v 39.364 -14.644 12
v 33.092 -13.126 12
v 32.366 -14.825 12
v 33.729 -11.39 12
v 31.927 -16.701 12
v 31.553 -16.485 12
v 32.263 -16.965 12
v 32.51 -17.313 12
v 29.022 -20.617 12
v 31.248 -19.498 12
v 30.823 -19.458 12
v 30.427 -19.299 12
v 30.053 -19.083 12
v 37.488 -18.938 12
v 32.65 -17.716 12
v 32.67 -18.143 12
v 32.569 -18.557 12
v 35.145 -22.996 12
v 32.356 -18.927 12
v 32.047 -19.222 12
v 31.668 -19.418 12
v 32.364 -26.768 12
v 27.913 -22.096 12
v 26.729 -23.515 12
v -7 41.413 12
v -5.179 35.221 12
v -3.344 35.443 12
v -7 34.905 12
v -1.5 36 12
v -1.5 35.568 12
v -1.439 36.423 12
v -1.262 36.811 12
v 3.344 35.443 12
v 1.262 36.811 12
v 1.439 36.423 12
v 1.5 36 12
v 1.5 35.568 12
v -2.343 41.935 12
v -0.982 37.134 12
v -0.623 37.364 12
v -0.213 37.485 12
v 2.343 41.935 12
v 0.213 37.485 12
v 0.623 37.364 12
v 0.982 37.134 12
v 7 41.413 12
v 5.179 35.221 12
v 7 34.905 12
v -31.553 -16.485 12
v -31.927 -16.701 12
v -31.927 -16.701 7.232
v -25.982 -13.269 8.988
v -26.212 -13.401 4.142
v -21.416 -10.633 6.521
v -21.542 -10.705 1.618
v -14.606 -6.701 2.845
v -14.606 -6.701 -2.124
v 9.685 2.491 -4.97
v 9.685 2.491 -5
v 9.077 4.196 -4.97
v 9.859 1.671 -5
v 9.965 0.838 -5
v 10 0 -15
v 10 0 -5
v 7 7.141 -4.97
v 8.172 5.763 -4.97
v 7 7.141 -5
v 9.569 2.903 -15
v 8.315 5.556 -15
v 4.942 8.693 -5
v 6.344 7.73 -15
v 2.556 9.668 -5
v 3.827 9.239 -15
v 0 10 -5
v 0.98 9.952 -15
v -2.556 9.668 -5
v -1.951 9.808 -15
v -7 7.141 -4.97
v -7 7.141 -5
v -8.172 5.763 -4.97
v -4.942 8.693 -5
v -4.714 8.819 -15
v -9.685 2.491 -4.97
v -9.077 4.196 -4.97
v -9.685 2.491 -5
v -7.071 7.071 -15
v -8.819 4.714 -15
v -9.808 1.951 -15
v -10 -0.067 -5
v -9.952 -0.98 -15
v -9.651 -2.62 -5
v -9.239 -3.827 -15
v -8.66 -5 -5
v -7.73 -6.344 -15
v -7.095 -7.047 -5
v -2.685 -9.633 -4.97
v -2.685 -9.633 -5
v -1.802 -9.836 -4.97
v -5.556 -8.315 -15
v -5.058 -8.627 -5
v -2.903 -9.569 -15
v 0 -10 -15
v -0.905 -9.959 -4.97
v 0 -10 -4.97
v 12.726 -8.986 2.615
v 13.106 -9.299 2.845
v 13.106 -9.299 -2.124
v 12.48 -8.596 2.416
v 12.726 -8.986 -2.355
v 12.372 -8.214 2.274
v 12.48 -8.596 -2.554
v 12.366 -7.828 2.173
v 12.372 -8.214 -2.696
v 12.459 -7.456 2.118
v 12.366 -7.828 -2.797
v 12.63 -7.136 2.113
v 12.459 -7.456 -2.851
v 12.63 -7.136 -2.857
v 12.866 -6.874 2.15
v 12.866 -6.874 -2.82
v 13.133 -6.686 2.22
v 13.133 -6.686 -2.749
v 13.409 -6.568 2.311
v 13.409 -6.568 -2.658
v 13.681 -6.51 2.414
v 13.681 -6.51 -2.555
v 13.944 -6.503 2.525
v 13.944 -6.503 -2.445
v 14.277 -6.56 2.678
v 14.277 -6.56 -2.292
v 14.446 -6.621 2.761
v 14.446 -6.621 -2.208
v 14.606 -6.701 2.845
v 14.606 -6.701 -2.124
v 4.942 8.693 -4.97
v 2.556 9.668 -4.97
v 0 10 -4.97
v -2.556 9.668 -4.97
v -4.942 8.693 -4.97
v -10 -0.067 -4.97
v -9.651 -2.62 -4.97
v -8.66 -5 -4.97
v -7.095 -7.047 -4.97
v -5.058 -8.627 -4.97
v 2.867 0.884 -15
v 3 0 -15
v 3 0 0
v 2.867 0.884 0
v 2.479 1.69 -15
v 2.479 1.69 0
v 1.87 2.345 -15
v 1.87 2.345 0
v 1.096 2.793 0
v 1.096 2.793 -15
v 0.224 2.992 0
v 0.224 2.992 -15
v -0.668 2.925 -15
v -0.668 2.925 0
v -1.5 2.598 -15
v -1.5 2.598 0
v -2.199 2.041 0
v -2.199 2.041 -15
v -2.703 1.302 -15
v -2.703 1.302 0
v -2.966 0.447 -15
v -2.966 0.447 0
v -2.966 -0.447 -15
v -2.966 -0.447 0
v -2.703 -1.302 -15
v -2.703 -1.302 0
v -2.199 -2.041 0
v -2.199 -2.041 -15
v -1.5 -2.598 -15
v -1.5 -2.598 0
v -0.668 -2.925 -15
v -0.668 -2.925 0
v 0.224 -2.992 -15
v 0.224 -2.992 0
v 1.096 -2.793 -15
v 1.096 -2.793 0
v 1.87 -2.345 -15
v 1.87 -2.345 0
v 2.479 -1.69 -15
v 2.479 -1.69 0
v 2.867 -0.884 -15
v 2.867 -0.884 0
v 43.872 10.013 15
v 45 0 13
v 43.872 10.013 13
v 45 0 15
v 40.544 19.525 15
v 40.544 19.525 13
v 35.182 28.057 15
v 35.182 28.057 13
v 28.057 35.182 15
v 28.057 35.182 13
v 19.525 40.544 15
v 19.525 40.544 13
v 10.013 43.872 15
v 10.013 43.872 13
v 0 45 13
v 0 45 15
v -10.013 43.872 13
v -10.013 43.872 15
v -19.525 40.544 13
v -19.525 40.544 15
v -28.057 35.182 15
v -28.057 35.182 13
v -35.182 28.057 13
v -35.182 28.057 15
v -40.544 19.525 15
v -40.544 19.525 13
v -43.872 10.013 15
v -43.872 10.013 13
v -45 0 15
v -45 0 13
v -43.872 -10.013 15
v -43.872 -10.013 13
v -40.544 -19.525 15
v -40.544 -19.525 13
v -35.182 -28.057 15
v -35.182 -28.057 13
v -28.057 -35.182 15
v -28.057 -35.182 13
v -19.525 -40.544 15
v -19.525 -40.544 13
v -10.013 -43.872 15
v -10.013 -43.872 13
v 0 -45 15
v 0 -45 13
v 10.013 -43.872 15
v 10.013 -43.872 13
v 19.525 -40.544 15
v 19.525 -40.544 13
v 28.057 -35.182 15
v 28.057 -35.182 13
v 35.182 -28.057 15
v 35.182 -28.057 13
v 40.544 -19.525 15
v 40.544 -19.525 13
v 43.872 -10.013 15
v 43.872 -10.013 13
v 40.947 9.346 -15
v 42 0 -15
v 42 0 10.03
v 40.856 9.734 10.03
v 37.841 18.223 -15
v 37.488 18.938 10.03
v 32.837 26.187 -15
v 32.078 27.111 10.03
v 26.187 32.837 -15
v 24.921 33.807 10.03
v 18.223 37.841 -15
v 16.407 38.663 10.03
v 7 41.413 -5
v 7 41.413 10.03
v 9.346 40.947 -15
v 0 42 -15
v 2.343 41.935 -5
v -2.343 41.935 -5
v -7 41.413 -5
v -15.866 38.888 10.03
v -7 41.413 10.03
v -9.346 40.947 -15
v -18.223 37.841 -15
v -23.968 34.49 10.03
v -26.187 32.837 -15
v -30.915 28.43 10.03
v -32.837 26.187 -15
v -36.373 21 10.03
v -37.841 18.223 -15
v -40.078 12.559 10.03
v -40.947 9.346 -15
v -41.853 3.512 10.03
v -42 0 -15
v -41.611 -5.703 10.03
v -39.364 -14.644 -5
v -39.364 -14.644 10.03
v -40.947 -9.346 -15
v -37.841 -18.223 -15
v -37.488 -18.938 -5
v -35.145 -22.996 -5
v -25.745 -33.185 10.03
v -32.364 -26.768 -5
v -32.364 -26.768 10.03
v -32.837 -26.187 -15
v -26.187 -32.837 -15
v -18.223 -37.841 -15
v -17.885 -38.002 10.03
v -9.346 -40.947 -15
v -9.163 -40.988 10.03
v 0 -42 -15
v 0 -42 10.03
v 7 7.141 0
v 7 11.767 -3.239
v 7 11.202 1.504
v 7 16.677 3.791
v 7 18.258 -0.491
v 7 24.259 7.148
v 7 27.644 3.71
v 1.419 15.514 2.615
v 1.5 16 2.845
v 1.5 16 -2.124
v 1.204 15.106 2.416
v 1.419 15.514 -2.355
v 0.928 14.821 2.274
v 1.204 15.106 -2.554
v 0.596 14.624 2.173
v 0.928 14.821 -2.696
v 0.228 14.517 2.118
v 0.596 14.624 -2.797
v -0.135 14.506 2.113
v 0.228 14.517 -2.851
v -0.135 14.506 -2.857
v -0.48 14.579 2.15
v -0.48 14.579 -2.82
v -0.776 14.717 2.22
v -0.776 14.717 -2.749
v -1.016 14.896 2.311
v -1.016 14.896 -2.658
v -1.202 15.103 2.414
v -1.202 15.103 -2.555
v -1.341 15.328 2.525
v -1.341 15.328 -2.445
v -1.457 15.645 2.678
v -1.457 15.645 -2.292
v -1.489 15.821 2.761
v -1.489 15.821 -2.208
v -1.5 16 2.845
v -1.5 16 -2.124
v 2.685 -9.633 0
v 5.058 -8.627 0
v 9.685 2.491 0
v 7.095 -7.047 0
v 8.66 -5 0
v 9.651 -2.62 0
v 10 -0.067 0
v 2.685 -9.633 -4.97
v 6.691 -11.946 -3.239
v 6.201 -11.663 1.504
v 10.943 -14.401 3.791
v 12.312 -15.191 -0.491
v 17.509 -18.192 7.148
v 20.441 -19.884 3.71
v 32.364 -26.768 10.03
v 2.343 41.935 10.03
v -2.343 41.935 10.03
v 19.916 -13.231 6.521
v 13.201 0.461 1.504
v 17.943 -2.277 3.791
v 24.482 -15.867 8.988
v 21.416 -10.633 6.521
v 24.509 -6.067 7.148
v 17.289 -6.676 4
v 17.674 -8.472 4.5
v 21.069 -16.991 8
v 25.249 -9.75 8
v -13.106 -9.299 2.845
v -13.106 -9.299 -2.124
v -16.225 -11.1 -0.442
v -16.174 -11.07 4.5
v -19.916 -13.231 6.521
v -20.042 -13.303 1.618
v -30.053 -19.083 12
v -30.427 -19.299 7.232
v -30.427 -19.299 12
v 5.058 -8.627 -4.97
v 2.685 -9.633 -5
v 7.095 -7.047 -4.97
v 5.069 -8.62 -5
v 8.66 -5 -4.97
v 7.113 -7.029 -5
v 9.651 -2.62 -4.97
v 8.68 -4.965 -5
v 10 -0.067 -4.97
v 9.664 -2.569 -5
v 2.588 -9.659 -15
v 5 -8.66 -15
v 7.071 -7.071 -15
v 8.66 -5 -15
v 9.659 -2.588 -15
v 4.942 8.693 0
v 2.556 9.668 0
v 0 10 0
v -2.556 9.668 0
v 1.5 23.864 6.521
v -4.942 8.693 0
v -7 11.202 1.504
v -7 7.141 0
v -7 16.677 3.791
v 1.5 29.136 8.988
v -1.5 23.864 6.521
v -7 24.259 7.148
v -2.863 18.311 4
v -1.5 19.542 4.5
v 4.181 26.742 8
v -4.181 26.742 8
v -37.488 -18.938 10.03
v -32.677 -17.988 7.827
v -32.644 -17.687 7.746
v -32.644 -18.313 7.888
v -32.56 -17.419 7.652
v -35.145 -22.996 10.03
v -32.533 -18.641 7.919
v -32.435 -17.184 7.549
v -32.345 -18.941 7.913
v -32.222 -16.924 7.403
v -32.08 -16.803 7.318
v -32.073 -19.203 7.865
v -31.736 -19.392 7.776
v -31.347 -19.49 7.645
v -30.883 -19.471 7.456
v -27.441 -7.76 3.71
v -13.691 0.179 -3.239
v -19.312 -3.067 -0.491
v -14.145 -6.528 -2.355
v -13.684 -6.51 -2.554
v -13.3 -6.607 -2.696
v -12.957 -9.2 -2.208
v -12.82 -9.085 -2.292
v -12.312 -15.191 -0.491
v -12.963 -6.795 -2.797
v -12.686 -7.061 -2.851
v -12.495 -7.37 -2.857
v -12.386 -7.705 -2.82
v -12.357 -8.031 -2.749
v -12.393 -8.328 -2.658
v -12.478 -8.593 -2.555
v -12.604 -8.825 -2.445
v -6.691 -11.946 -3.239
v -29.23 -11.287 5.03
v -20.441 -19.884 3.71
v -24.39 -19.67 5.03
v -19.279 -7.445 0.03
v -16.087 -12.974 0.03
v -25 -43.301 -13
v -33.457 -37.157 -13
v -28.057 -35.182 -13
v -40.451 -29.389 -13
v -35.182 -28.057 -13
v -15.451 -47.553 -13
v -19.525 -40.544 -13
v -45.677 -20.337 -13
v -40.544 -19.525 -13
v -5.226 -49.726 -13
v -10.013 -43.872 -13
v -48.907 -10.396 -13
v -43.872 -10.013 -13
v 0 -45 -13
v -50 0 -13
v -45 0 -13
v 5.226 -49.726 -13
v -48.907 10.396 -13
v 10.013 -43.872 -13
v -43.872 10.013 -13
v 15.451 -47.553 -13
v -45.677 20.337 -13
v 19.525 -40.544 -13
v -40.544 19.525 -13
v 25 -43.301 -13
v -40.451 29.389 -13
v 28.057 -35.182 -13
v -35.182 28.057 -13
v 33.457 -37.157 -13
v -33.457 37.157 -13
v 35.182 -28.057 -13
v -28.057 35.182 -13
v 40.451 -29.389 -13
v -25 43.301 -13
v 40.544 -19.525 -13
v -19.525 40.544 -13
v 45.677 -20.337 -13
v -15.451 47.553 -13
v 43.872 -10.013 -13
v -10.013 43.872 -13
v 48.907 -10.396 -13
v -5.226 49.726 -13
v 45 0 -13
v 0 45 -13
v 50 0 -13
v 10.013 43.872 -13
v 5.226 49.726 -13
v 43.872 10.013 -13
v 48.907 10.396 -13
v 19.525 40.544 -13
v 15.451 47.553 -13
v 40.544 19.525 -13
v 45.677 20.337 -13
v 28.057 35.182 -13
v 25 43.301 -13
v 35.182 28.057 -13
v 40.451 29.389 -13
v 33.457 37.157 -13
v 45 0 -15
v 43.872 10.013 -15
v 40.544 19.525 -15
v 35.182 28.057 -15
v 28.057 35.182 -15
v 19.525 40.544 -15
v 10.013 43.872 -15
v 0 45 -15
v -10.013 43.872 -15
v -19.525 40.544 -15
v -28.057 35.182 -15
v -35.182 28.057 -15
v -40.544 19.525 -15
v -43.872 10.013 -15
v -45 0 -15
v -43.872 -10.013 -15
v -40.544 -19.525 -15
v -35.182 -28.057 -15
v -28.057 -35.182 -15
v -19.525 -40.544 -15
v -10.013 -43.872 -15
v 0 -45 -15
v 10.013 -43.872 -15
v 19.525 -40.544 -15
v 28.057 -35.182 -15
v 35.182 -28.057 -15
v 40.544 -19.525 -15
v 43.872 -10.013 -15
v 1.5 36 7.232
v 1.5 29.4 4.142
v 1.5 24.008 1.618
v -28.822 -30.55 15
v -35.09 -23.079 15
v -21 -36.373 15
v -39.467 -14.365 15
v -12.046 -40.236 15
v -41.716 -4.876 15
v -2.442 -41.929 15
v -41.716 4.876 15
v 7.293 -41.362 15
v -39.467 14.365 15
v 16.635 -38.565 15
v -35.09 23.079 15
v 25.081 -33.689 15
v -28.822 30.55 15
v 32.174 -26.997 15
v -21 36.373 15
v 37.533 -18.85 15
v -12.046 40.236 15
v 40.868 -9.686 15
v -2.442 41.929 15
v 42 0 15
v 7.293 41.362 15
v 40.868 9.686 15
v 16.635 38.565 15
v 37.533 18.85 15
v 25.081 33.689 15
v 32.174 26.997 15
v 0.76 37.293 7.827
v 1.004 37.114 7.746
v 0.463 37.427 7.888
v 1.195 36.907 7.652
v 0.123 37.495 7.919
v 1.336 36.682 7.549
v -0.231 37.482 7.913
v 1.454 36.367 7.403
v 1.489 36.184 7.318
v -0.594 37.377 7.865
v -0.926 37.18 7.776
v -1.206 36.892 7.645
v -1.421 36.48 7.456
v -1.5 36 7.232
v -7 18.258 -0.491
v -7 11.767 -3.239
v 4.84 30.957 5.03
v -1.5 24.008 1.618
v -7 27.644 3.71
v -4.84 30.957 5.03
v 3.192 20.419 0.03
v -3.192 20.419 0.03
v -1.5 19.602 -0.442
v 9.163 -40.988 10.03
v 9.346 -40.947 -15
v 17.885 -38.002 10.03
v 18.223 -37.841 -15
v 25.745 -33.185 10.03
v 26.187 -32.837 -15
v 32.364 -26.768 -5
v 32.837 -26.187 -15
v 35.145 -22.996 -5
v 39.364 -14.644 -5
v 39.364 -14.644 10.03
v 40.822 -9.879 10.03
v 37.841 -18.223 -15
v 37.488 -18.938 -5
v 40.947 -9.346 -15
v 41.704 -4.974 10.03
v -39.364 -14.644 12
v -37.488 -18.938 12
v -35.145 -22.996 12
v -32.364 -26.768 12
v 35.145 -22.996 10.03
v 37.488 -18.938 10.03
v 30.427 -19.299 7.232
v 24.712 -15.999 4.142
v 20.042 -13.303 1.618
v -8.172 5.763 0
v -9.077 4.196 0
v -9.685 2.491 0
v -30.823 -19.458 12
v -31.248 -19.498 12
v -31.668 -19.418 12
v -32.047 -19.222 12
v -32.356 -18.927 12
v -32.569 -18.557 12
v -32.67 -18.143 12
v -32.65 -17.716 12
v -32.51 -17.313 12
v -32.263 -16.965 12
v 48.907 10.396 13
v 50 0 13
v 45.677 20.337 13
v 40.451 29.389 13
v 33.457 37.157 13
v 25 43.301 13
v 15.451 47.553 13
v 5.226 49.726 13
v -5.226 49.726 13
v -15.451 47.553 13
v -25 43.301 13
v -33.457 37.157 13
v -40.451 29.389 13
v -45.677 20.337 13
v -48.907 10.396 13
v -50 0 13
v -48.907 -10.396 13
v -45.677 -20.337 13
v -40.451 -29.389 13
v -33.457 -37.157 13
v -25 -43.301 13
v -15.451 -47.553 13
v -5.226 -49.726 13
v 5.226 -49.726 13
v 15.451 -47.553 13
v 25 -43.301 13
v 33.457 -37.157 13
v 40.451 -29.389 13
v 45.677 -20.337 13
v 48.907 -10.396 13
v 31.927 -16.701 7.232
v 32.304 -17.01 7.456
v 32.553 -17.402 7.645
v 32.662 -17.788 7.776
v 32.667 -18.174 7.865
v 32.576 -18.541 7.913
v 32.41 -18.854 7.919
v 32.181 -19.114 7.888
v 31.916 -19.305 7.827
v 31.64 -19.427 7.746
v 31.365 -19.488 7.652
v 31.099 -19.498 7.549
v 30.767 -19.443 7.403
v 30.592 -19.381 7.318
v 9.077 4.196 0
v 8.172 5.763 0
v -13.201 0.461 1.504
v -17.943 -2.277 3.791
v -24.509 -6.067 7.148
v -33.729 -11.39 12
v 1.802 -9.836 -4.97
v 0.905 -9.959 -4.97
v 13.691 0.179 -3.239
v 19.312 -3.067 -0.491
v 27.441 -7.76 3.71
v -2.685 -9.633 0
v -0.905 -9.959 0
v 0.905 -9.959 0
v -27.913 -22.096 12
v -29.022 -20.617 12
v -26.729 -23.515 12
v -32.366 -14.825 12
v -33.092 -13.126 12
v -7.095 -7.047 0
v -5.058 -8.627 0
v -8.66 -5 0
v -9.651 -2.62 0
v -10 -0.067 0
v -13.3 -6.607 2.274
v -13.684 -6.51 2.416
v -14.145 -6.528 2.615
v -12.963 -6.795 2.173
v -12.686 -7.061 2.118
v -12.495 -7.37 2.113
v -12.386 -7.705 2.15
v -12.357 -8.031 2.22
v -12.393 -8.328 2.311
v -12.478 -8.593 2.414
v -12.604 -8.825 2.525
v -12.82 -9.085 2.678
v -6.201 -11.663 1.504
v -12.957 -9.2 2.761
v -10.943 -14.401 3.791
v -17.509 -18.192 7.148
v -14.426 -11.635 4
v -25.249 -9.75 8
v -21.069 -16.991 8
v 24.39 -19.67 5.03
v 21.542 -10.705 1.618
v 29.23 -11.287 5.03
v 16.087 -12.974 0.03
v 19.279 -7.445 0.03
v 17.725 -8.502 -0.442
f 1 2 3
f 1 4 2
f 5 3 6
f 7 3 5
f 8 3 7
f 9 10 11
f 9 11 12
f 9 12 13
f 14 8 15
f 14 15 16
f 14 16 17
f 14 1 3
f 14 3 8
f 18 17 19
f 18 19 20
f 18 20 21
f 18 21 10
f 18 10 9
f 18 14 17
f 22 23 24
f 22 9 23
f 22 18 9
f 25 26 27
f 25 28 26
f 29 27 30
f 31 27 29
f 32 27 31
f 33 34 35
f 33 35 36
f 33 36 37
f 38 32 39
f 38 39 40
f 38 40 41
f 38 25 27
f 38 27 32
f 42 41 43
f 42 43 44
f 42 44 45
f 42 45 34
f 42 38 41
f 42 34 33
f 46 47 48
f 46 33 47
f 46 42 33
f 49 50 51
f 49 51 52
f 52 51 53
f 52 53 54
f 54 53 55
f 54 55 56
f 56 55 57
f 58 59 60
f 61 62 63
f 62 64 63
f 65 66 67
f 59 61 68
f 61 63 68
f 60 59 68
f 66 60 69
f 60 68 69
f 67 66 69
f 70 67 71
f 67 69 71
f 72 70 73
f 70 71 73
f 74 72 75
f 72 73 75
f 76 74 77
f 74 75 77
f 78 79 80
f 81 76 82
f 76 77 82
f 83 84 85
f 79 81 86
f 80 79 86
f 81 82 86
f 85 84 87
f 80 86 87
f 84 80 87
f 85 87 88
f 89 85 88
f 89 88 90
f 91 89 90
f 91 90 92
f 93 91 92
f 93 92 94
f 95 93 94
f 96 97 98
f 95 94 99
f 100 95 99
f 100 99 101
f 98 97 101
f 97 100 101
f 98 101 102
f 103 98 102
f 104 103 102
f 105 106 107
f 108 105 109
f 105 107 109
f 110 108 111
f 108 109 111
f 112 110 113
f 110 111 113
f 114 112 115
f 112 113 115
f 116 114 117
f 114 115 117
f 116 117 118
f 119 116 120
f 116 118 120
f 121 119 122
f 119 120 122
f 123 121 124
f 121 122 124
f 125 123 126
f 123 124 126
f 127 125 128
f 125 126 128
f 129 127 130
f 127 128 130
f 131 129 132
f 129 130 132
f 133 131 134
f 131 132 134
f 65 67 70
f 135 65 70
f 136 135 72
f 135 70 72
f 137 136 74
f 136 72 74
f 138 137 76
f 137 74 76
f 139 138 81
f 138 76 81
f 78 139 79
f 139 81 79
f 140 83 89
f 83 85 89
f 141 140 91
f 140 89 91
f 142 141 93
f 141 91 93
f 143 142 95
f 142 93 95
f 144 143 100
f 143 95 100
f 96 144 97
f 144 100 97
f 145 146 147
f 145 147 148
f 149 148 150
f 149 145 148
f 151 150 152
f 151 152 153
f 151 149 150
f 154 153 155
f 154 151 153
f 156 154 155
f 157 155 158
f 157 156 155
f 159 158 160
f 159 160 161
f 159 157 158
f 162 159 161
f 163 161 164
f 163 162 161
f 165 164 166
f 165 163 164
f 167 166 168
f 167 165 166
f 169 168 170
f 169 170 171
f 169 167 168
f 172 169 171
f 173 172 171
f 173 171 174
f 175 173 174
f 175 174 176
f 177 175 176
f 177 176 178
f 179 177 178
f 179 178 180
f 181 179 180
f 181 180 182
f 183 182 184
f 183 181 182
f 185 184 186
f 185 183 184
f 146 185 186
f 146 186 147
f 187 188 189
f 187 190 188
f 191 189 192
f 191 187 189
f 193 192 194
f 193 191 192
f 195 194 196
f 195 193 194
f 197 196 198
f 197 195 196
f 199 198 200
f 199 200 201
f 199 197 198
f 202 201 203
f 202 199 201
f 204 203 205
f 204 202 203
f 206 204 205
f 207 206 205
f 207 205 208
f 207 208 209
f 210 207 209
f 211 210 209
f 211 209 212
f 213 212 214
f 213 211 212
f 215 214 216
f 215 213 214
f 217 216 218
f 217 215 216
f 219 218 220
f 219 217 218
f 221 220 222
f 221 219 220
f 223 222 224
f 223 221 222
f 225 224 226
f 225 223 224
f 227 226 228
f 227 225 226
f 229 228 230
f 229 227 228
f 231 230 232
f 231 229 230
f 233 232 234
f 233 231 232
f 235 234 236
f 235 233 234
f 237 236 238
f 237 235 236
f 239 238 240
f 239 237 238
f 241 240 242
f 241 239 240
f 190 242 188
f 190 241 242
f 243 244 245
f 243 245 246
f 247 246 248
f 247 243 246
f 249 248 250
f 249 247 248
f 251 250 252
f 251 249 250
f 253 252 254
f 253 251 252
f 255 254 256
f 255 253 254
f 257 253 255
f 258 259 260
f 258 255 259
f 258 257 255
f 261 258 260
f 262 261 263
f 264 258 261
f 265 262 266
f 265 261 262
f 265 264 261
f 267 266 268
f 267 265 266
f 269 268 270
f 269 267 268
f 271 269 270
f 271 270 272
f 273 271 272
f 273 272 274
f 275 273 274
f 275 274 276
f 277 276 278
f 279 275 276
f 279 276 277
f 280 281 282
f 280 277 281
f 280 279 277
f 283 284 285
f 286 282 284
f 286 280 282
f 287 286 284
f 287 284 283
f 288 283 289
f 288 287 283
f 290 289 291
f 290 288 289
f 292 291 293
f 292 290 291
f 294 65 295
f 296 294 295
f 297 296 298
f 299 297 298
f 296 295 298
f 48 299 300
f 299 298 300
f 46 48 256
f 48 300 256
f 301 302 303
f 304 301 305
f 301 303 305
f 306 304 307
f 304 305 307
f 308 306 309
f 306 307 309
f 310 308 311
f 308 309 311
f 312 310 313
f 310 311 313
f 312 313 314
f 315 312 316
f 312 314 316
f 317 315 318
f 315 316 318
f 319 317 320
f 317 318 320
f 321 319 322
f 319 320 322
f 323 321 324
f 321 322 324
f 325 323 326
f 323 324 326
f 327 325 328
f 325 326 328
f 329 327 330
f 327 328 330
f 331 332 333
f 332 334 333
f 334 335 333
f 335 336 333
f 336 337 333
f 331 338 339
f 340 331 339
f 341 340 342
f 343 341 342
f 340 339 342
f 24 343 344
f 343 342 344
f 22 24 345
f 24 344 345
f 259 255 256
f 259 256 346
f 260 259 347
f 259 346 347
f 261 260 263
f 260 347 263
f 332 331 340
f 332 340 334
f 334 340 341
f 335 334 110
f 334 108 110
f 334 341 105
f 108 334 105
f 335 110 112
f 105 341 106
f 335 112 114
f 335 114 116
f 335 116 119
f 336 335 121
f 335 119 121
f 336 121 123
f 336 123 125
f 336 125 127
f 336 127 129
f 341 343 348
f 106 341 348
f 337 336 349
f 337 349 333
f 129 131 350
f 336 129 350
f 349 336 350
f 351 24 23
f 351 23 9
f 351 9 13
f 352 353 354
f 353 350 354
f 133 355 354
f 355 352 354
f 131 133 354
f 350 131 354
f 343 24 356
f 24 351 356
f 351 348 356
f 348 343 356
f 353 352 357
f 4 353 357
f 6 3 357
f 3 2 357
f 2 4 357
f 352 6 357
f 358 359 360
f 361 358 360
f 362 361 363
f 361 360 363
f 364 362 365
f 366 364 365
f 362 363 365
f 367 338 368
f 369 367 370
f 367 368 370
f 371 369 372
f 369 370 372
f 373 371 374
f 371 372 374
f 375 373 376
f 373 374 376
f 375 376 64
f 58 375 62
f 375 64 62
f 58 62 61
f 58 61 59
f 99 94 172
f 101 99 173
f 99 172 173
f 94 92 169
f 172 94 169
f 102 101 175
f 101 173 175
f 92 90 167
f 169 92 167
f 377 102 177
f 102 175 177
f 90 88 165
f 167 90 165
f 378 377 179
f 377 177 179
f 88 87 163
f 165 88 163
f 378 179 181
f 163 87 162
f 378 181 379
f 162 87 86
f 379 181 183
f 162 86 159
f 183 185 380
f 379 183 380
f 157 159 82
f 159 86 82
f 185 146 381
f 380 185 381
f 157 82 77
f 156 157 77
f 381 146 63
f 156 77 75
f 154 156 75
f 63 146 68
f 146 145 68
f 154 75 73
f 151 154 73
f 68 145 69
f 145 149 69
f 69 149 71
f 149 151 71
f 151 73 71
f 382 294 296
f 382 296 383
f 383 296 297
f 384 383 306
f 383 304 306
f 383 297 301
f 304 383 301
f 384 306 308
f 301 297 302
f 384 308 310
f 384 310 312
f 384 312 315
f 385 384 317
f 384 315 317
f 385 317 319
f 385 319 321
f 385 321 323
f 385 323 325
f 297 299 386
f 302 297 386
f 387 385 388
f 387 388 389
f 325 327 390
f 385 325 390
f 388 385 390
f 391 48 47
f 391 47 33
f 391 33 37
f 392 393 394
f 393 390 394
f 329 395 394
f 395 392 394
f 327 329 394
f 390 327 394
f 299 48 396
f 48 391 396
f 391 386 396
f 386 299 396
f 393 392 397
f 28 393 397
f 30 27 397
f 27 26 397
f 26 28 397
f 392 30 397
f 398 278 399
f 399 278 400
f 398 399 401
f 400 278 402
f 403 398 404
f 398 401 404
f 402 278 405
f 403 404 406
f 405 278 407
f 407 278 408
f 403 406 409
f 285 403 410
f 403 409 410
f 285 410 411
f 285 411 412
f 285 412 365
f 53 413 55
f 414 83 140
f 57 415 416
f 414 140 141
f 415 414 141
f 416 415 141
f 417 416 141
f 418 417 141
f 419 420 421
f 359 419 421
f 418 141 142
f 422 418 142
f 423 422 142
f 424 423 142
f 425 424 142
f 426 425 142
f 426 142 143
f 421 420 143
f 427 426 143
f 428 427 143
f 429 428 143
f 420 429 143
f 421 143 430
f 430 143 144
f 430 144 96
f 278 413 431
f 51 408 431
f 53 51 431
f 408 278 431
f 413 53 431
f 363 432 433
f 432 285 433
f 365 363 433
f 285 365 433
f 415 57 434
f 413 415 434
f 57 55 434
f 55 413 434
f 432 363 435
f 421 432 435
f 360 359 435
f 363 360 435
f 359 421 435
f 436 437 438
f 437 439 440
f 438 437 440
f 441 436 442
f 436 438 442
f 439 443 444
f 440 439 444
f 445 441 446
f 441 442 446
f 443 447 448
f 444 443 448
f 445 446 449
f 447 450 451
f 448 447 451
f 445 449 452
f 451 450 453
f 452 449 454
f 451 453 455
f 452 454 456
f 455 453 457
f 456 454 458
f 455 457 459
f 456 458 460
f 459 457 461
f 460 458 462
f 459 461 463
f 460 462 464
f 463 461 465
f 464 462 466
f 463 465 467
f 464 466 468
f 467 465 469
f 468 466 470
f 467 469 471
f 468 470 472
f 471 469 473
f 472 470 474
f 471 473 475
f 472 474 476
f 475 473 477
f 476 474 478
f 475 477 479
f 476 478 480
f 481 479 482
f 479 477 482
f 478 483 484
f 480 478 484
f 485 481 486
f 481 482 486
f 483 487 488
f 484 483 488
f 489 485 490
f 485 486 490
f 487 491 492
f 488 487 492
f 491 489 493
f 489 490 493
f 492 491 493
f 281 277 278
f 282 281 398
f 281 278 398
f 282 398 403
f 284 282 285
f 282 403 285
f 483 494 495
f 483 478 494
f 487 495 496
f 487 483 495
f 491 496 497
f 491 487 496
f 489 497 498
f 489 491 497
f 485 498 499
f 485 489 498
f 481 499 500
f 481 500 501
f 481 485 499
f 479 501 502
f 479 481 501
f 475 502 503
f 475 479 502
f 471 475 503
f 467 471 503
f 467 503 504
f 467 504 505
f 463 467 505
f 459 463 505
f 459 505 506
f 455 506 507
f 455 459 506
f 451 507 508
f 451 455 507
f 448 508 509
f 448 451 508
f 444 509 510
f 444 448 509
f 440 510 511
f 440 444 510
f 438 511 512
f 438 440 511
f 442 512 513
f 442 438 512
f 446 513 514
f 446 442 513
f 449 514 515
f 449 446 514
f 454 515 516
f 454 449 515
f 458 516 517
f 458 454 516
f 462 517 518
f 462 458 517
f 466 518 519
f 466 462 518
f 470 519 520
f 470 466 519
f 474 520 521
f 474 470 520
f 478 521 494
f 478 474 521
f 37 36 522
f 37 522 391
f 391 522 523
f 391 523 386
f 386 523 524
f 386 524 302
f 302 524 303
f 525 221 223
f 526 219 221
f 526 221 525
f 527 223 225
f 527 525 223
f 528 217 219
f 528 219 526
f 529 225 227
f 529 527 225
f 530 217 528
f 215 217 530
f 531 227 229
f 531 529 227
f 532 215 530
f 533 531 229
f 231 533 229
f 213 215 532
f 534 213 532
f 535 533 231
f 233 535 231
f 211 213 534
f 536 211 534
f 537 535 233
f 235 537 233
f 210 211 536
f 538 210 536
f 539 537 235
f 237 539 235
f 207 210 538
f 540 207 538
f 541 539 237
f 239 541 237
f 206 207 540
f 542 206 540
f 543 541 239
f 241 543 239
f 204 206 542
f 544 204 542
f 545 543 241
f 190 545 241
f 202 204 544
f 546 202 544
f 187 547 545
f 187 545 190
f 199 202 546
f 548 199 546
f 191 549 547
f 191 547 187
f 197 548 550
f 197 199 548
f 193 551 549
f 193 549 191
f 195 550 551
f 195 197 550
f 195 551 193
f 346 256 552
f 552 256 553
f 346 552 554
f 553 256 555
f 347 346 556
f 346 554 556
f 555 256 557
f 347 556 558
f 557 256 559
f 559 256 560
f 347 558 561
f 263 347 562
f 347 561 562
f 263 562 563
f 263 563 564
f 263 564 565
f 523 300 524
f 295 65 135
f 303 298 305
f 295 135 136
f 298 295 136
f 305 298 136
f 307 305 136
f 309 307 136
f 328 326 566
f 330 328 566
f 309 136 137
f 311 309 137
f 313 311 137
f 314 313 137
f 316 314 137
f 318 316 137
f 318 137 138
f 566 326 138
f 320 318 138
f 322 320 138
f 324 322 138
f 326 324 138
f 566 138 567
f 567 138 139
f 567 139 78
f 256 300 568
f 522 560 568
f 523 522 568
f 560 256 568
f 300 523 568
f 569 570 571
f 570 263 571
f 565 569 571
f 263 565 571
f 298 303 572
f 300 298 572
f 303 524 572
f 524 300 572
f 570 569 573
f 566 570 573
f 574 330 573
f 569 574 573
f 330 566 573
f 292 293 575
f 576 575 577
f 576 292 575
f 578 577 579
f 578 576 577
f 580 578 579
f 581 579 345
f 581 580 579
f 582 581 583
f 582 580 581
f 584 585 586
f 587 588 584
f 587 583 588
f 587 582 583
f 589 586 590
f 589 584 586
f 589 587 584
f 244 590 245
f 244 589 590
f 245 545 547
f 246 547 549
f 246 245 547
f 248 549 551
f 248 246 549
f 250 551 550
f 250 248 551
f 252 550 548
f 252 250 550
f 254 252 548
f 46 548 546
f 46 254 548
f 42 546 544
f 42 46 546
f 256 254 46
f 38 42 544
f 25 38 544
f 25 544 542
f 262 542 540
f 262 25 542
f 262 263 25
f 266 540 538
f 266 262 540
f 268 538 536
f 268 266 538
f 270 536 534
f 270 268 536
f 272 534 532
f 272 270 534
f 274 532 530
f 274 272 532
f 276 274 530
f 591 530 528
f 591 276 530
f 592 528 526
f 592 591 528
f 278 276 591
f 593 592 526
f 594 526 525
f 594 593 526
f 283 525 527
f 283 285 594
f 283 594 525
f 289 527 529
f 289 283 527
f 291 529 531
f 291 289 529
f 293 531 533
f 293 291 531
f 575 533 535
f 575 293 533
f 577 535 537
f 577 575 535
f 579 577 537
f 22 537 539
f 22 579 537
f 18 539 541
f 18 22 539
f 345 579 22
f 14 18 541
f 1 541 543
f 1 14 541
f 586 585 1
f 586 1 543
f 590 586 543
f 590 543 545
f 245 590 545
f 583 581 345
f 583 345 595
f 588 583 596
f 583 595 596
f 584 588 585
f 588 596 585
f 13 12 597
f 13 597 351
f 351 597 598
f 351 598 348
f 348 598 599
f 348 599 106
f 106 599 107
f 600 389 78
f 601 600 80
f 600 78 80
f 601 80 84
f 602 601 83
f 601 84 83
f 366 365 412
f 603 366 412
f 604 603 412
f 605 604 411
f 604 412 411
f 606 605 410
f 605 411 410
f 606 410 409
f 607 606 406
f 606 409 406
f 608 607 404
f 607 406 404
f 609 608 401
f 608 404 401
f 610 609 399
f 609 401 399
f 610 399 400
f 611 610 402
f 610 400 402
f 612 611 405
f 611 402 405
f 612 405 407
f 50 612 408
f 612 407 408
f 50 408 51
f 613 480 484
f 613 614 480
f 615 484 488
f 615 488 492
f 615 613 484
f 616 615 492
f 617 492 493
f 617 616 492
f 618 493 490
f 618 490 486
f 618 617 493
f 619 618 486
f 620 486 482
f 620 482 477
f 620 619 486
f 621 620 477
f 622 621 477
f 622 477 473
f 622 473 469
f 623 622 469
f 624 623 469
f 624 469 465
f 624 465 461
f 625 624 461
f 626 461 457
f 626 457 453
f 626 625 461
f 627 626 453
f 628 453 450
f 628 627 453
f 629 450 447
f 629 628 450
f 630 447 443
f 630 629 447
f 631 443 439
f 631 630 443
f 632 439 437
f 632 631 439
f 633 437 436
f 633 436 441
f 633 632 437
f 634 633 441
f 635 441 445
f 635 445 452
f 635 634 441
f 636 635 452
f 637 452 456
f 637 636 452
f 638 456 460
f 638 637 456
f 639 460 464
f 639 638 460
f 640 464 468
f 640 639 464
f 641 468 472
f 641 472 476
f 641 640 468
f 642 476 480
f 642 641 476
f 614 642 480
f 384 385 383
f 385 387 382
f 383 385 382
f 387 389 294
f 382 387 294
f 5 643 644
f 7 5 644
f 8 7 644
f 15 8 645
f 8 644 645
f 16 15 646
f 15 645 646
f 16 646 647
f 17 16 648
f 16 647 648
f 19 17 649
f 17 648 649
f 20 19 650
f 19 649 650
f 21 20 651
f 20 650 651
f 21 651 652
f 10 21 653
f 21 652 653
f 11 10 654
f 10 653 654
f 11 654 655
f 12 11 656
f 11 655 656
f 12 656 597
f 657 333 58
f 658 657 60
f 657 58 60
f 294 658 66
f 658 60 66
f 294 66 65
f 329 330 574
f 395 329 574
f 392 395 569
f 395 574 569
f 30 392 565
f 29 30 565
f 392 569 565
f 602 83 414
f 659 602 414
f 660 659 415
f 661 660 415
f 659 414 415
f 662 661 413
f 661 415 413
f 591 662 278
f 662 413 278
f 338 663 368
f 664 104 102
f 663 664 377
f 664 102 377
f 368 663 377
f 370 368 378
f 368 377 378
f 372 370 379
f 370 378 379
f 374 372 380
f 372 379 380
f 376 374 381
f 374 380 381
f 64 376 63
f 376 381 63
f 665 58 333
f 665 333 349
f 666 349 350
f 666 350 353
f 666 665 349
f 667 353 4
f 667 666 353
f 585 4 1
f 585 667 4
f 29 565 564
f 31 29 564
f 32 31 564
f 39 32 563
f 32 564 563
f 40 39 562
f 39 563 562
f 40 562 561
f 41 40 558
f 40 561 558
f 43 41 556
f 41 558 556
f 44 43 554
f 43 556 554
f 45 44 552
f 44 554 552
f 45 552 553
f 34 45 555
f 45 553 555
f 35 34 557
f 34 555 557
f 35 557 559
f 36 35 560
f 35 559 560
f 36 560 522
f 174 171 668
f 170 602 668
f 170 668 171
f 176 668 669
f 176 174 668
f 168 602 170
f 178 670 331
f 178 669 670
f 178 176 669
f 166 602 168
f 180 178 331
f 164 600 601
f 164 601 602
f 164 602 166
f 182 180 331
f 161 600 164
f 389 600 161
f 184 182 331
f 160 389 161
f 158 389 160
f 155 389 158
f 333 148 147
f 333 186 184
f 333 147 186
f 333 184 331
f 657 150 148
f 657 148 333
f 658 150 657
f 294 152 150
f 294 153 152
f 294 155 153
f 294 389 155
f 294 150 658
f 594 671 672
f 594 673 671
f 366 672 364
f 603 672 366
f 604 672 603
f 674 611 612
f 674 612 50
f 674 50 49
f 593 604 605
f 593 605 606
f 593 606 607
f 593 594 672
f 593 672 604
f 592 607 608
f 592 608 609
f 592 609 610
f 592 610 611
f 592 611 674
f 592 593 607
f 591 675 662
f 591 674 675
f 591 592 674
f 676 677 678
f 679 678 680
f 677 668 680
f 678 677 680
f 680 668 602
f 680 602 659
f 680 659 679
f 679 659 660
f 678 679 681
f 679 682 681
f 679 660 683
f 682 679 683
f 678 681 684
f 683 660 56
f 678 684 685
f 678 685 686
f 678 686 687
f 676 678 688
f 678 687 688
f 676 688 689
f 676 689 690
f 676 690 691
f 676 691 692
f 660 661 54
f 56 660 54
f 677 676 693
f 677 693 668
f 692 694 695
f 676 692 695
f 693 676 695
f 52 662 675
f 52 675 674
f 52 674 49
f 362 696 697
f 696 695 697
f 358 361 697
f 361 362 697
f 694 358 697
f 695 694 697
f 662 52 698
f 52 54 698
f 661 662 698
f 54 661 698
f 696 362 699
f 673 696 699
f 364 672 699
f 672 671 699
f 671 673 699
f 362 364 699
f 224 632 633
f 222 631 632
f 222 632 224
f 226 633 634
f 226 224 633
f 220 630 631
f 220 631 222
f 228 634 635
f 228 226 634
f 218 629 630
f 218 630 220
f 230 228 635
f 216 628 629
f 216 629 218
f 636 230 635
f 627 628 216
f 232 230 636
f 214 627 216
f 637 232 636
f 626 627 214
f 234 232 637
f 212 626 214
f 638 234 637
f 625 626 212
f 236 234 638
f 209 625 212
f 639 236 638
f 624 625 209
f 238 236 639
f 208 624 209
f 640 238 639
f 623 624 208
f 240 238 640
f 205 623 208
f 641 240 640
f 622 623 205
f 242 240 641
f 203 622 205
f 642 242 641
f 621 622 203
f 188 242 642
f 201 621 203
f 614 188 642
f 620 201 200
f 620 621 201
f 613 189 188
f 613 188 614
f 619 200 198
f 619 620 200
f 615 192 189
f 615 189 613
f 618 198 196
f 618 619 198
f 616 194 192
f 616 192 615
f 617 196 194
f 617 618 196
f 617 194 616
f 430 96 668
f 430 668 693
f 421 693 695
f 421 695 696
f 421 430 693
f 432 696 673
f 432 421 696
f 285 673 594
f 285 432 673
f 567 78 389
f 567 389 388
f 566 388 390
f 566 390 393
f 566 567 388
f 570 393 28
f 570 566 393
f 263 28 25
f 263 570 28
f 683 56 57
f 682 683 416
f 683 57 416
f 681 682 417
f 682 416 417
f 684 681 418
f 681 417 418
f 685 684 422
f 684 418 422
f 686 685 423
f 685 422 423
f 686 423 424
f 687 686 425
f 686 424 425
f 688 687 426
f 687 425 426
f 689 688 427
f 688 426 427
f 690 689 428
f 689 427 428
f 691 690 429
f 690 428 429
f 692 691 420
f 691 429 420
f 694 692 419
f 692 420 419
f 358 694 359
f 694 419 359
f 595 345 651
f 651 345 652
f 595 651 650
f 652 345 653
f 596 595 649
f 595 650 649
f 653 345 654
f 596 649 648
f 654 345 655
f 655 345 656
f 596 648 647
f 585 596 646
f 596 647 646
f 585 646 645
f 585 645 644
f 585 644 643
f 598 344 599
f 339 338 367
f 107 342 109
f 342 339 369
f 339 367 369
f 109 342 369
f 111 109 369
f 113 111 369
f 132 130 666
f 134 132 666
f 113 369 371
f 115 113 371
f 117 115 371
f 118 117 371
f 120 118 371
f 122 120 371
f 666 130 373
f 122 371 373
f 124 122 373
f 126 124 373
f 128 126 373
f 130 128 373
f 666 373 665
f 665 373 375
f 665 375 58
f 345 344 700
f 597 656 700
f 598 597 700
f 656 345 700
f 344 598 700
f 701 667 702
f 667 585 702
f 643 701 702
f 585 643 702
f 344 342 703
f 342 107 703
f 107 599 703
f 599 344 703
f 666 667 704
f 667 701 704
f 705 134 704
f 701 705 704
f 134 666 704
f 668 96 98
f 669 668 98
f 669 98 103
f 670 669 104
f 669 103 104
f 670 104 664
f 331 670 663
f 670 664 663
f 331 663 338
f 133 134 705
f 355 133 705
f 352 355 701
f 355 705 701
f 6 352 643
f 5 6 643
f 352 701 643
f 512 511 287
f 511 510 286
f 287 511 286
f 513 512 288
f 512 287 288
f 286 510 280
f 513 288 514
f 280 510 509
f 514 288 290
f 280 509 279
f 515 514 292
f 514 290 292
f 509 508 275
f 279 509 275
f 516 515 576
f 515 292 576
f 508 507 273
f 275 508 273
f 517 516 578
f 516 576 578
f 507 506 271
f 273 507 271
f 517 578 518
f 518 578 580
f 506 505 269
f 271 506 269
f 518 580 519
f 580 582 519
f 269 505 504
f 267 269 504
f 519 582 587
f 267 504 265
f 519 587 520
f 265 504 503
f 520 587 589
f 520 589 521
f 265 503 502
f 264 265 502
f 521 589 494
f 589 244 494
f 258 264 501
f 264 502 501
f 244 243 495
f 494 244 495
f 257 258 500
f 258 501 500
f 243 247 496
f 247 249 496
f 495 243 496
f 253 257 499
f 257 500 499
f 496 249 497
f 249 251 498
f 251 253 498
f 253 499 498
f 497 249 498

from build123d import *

# Parameters (mm, degrees)
SKETCH1_R           = 45
SKETCH1_R_2         = 42
BOSS_EXTRUDE1_DEPTH = 15
BOSS_EXTRUDE2_START = -15
SKETCH1_3_R         = 10
SKETCH1_3_R_2       = 3
BOSS_EXTRUDE2_DEPTH = 15
BOSS_EXTRUDE3_START = -5
SKETCH2_W           = 14
SKETCH2_H           = 37.310793113
BOSS_EXTRUDE3_DEPTH = 17
CIRPATTERN1_COUNT   = 3
SKETCH1_4_R         = 50
SKETCH1_4_R_2       = 45
BOSS_EXTRUDE4_DEPTH = 13


with BuildPart() as part:
    # Sketch1 → Boss-Extrude1 (new body, symmetric)
    with BuildSketch(Plane.XY):
        Circle(SKETCH1_R)
        Circle(SKETCH1_R_2, mode=Mode.SUBTRACT)
    extrude(amount=BOSS_EXTRUDE1_DEPTH, both=True)



with BuildPart() as body_2:
    # Sketch1<3> → Boss-Extrude2 (new body)
    with BuildSketch(Plane.XY.offset(BOSS_EXTRUDE2_START)):
        Circle(SKETCH1_3_R)
        Circle(SKETCH1_3_R_2, mode=Mode.SUBTRACT)
    extrude(amount=BOSS_EXTRUDE2_DEPTH)


with BuildPart() as part_1:
    add(part.part)

    add(body_2.part)  # Boss-Extrude3 merges body 2
    # Sketch2 → Boss-Extrude3 (add)
    with BuildSketch(Plane.XY.offset(BOSS_EXTRUDE3_START)):
        with Locations((0, 25.796824986)):
            Rectangle(SKETCH2_W, SKETCH2_H)
        with BuildLine():
            Line((1.5, 36), (1.5, 16))
            ThreePointArc((1.5, 16), (0, 14.5), (-1.5, 16))
            Line((-1.5, 16), (-1.5, 36))
            ThreePointArc((-1.5, 36), (0, 37.5), (1.5, 36))
        make_face(mode=Mode.SUBTRACT)
    boss_extrude3 = extrude(amount=BOSS_EXTRUDE3_DEPTH)

    # CirPattern1: Boss-Extrude3 ×3 about axis
    cirpattern1_axis = Axis((0, 0, 0), (0, 0, 1))
    for i in range(1, CIRPATTERN1_COUNT):
        add(boss_extrude3.rotate(cirpattern1_axis, i * 360 / CIRPATTERN1_COUNT))

    # Sketch3 → Cut-Revolve1 (revolve, cut)
    with BuildSketch(Plane(origin=(0, 0, 0), x_dir=(0, 0, -1), z_dir=(1, 0, 0))):
        Polygon((0, 0), (0, -10), (-15, -42), (-15, 0), align=None)
        Polygon((4.969855419, -10), (15, -10), (15, -42), (-10.030144581, -42), align=None)
    revolve(axis=Axis((0, 0, 0), (0, 0, 1)), mode=Mode.SUBTRACT)

    # Sketch1<4> → Boss-Extrude4 (add, symmetric)
    with BuildSketch(Plane.XY):
        Circle(SKETCH1_4_R)
        Circle(SKETCH1_4_R_2, mode=Mode.SUBTRACT)
    extrude(amount=BOSS_EXTRUDE4_DEPTH, both=True)


solid = part_1.part
